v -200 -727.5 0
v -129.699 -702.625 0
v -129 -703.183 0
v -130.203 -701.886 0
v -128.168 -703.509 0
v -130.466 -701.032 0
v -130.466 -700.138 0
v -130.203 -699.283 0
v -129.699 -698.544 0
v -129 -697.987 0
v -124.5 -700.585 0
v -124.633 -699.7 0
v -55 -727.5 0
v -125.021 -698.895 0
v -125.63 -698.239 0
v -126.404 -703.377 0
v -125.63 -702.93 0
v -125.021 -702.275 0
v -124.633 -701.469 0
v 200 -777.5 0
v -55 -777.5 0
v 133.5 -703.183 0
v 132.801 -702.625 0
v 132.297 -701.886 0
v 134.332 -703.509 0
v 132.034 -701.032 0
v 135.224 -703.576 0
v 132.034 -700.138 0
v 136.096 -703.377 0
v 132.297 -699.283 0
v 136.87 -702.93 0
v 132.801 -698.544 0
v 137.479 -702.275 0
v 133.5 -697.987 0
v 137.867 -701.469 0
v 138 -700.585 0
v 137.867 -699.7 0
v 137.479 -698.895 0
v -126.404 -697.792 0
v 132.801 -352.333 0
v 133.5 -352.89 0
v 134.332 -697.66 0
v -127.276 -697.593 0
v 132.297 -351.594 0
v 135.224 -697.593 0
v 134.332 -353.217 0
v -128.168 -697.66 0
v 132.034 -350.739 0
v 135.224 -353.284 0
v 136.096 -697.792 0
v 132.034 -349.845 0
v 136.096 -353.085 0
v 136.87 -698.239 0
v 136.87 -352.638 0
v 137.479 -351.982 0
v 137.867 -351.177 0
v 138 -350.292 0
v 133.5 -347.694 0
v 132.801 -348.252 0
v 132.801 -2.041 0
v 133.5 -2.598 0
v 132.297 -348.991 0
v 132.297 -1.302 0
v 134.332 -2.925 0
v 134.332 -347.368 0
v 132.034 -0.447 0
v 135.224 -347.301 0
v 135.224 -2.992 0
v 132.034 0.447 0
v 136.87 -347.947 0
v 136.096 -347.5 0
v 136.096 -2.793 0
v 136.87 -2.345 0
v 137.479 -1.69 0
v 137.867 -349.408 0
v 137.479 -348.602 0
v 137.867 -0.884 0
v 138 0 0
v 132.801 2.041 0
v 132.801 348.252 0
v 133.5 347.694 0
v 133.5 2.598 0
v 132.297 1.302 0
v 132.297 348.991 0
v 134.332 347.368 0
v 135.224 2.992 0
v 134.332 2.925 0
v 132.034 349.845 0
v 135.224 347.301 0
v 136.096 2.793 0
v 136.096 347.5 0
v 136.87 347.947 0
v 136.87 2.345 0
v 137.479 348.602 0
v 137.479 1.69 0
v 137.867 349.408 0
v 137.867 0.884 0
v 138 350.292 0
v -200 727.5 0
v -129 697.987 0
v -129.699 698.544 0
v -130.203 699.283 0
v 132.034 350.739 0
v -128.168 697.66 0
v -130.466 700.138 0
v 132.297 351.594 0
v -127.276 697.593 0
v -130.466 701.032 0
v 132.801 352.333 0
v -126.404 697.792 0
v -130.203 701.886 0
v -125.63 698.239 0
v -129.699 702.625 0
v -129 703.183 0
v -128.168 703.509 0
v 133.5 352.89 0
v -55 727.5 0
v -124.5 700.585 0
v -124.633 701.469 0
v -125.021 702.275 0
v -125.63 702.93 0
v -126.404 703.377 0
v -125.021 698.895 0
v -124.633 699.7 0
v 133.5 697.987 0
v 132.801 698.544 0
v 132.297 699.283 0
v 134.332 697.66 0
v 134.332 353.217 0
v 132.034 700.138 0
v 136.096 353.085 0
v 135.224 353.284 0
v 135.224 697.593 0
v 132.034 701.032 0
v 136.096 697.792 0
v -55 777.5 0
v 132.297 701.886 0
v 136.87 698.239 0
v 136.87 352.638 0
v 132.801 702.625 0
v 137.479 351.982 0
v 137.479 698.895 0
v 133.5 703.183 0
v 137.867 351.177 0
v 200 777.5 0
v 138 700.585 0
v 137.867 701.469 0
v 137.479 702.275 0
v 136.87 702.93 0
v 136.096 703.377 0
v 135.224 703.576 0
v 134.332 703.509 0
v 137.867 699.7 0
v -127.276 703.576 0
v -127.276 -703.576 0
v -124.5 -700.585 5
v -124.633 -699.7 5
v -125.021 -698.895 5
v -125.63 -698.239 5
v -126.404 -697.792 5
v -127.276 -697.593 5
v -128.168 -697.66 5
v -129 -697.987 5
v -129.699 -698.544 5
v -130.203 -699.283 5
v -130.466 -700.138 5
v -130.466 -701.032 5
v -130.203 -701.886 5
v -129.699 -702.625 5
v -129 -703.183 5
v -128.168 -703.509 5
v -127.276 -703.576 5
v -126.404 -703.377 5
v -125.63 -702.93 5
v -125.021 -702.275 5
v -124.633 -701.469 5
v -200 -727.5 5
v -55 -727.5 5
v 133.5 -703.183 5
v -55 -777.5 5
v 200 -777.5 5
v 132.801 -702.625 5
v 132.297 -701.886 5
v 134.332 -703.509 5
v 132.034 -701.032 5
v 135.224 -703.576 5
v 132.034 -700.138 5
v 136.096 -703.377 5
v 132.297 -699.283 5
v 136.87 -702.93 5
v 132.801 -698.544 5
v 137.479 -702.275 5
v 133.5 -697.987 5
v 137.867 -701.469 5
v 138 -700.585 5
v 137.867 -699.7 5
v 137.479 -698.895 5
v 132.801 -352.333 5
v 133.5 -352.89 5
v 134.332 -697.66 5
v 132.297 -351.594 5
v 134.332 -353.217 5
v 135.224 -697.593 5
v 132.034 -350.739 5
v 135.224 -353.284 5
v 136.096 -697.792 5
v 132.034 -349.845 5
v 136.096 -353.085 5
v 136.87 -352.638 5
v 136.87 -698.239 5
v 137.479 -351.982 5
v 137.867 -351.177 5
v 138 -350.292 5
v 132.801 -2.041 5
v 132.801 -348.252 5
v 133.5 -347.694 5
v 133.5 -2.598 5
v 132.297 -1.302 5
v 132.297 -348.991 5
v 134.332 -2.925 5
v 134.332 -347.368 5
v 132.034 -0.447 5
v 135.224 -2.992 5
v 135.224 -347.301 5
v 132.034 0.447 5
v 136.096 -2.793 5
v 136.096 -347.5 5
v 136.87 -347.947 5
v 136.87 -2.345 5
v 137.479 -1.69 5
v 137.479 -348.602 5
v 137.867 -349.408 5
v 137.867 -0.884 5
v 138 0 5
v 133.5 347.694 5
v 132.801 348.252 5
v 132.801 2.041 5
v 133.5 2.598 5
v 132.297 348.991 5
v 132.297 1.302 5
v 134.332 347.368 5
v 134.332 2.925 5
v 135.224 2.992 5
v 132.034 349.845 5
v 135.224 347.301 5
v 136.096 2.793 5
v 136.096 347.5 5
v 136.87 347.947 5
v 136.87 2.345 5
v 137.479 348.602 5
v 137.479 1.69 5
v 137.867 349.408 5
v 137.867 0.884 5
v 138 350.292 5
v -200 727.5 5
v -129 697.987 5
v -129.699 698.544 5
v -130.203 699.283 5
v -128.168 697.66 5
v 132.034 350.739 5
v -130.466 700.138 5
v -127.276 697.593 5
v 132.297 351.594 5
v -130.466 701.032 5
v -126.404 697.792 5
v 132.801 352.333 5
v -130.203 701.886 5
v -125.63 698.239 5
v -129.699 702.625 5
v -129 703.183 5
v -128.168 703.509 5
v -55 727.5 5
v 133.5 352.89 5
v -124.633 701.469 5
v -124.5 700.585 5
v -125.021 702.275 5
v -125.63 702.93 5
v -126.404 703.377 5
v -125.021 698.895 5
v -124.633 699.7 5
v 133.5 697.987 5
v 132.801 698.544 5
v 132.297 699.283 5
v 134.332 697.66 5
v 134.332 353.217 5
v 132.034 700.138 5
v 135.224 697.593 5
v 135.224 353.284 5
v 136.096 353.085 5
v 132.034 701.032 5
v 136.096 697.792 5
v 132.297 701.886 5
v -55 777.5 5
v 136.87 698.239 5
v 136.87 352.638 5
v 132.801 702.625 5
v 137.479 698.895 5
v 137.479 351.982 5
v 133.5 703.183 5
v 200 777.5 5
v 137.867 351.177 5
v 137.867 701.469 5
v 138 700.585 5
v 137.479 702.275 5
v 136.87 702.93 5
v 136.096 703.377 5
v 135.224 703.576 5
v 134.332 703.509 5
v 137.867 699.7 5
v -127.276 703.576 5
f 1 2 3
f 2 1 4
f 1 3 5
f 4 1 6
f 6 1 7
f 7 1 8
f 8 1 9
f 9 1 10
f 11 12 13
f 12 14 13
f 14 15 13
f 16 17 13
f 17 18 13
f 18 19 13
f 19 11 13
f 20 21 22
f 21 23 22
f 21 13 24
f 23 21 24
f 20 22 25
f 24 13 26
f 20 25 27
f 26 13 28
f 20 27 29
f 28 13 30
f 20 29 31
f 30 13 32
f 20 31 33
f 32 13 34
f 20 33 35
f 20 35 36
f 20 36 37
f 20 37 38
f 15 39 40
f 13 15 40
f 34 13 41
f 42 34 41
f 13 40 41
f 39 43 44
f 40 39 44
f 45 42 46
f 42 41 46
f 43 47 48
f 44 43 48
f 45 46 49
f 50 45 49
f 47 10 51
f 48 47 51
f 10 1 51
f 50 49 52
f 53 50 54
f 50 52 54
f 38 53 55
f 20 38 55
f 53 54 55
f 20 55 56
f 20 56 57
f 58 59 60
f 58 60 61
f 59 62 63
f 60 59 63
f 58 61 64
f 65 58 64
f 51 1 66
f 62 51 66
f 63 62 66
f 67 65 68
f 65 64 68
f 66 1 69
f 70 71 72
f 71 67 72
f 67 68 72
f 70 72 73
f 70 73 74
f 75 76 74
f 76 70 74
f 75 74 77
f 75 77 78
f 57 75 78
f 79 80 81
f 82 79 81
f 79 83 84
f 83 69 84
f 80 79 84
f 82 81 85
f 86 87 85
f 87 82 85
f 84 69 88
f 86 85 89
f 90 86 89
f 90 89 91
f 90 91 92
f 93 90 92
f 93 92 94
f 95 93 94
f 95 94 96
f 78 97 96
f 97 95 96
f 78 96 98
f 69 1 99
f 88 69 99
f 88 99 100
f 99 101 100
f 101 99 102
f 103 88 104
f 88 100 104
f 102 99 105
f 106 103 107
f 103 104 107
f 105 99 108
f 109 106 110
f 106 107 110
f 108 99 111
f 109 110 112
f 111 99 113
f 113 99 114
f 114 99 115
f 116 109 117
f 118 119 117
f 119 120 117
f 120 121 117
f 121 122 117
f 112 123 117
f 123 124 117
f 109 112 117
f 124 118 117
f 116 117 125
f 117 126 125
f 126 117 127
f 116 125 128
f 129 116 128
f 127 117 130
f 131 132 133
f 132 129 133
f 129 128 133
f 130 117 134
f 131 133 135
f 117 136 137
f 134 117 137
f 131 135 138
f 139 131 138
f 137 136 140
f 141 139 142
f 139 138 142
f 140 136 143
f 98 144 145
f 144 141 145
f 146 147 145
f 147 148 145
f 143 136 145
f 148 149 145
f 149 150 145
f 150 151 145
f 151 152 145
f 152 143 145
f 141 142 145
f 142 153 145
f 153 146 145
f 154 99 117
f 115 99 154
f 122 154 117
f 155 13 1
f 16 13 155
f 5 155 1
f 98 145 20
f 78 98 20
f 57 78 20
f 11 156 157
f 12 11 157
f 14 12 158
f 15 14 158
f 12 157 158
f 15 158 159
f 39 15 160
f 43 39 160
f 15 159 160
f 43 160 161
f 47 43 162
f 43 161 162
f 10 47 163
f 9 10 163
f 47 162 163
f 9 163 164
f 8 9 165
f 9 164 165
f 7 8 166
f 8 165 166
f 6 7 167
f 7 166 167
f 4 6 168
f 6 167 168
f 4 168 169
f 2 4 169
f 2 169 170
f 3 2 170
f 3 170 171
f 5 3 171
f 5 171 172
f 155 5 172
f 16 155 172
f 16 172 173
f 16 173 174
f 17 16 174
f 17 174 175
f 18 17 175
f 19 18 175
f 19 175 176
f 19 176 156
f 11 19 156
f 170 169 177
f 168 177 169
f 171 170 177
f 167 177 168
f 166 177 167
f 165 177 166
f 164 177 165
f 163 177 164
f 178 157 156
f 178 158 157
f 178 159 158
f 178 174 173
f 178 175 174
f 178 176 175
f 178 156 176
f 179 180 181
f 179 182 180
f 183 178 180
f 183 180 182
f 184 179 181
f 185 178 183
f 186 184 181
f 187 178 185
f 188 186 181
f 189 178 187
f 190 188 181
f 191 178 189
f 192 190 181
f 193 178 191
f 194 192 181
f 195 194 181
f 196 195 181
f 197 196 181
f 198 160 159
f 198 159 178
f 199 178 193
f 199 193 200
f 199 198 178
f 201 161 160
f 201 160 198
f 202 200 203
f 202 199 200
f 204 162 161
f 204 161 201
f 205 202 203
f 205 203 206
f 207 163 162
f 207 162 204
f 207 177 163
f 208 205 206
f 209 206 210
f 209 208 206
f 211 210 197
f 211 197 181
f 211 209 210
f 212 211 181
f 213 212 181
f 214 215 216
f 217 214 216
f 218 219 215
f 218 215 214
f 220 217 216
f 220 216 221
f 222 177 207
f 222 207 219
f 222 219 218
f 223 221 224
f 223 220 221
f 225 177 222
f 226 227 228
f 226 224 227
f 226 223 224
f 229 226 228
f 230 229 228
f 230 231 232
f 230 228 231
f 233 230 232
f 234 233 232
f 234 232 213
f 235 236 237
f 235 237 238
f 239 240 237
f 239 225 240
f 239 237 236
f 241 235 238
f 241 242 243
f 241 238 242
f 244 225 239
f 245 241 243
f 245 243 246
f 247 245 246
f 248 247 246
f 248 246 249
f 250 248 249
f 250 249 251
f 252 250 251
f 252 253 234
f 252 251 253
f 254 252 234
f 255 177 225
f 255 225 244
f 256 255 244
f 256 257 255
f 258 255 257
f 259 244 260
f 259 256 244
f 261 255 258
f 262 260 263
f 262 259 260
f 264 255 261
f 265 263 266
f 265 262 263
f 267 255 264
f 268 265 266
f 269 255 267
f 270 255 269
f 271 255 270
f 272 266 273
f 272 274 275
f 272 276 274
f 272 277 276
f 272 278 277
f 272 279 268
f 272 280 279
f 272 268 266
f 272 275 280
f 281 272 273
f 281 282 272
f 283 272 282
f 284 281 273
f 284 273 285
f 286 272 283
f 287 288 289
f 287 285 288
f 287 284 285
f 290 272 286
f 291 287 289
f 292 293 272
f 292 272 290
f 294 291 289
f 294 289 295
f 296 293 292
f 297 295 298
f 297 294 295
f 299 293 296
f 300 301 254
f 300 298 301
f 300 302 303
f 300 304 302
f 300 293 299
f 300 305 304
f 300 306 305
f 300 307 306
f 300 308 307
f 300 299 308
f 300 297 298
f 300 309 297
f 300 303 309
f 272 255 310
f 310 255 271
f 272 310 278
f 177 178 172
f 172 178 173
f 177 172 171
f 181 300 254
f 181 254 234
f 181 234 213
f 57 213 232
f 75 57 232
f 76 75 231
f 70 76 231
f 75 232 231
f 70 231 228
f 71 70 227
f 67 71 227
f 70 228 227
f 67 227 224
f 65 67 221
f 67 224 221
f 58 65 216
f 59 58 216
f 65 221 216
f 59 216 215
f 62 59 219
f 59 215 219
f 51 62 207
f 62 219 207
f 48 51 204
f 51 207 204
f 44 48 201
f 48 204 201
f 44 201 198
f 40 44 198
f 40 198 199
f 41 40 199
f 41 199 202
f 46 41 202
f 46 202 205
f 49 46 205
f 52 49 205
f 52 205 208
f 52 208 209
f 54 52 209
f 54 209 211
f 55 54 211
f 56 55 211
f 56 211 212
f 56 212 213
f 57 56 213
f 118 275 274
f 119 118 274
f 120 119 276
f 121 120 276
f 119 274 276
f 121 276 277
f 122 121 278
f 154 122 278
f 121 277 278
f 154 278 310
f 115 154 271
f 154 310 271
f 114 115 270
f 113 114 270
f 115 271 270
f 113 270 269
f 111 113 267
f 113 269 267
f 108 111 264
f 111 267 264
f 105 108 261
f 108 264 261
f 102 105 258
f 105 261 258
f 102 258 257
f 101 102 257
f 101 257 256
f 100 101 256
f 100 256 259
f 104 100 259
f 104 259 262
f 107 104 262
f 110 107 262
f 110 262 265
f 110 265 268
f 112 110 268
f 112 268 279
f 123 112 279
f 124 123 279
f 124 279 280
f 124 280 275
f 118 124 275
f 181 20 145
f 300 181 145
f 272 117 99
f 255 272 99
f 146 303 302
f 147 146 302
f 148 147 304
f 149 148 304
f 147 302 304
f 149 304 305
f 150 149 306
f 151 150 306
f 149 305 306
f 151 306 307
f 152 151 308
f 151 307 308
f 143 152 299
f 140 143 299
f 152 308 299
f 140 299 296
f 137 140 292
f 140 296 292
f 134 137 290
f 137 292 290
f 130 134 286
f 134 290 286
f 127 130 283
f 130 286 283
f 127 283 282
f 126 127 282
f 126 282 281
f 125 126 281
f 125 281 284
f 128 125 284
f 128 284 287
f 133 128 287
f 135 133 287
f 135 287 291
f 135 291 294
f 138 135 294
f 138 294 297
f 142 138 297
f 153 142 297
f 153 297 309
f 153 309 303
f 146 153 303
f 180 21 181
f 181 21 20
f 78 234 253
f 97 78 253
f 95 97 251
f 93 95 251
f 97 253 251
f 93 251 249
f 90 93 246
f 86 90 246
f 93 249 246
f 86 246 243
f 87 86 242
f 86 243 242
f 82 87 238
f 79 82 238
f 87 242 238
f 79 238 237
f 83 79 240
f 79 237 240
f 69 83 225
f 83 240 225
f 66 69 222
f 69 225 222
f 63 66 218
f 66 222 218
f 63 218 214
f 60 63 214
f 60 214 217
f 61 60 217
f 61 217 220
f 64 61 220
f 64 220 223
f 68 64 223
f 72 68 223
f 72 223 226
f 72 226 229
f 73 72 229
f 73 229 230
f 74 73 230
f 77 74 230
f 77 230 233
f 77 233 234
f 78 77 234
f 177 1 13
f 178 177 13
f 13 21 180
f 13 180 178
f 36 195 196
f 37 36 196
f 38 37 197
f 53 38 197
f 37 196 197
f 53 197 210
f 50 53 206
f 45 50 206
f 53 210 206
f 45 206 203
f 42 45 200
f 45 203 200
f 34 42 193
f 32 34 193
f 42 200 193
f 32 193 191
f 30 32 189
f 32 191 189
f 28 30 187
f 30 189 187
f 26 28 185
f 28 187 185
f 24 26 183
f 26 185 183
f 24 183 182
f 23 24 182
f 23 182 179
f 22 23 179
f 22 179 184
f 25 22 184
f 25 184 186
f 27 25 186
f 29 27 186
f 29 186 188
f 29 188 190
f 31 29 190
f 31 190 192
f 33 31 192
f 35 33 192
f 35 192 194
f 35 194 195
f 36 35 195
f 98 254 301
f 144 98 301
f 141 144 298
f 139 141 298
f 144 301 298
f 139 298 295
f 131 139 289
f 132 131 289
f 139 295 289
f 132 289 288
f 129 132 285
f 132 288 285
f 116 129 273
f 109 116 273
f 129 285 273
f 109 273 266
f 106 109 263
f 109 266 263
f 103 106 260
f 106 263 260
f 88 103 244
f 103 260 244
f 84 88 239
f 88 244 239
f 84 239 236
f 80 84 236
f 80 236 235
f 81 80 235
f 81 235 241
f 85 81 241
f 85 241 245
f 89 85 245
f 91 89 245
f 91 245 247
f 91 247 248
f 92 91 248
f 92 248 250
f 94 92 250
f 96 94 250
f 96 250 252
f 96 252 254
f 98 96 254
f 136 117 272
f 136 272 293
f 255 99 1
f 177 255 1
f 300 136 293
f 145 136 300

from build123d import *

# Parameters (mm, degrees)
F0_W     = 255
F0_H     = 50
F1_DEPTH = 5
F2_R     = 3
F3_DEPTH = 5.001


with BuildPart() as f1:
    # F0 (on Top) → F1 (new body)
    with BuildSketch(Plane.XY):
        Polygon((200, -727.5), (200, 727.5), (-55, 727.5), (-200, 727.5), (-200, -727.5), (-55, -727.5), align=None)
        with Locations((72.5, -752.5)):
            Rectangle(F0_W, F0_H)
        with Locations((72.5, 752.5)):
            Rectangle(F0_W, F0_H)
    extrude(amount=F1_DEPTH)

    # F2 (on face) → F3 (cut, through all)
    with BuildSketch(Plane.XY.offset(5)):
        with Locations((135, 0)):
            Circle(F2_R)
        with Locations((-127.5, -700.58465)):
            Circle(F2_R)
        with Locations((135, -700.58465)):
            Circle(F2_R)
        with Locations((135, -350.292325)):
            Circle(F2_R)
        with Locations((-127.5, 700.58465)):
            Circle(F2_R)
        with Locations((135, 700.58465)):
            Circle(F2_R)
        with Locations((135, 350.292325)):
            Circle(F2_R)
    extrude(amount=-F3_DEPTH, mode=Mode.SUBTRACT)


solid = f1.part
